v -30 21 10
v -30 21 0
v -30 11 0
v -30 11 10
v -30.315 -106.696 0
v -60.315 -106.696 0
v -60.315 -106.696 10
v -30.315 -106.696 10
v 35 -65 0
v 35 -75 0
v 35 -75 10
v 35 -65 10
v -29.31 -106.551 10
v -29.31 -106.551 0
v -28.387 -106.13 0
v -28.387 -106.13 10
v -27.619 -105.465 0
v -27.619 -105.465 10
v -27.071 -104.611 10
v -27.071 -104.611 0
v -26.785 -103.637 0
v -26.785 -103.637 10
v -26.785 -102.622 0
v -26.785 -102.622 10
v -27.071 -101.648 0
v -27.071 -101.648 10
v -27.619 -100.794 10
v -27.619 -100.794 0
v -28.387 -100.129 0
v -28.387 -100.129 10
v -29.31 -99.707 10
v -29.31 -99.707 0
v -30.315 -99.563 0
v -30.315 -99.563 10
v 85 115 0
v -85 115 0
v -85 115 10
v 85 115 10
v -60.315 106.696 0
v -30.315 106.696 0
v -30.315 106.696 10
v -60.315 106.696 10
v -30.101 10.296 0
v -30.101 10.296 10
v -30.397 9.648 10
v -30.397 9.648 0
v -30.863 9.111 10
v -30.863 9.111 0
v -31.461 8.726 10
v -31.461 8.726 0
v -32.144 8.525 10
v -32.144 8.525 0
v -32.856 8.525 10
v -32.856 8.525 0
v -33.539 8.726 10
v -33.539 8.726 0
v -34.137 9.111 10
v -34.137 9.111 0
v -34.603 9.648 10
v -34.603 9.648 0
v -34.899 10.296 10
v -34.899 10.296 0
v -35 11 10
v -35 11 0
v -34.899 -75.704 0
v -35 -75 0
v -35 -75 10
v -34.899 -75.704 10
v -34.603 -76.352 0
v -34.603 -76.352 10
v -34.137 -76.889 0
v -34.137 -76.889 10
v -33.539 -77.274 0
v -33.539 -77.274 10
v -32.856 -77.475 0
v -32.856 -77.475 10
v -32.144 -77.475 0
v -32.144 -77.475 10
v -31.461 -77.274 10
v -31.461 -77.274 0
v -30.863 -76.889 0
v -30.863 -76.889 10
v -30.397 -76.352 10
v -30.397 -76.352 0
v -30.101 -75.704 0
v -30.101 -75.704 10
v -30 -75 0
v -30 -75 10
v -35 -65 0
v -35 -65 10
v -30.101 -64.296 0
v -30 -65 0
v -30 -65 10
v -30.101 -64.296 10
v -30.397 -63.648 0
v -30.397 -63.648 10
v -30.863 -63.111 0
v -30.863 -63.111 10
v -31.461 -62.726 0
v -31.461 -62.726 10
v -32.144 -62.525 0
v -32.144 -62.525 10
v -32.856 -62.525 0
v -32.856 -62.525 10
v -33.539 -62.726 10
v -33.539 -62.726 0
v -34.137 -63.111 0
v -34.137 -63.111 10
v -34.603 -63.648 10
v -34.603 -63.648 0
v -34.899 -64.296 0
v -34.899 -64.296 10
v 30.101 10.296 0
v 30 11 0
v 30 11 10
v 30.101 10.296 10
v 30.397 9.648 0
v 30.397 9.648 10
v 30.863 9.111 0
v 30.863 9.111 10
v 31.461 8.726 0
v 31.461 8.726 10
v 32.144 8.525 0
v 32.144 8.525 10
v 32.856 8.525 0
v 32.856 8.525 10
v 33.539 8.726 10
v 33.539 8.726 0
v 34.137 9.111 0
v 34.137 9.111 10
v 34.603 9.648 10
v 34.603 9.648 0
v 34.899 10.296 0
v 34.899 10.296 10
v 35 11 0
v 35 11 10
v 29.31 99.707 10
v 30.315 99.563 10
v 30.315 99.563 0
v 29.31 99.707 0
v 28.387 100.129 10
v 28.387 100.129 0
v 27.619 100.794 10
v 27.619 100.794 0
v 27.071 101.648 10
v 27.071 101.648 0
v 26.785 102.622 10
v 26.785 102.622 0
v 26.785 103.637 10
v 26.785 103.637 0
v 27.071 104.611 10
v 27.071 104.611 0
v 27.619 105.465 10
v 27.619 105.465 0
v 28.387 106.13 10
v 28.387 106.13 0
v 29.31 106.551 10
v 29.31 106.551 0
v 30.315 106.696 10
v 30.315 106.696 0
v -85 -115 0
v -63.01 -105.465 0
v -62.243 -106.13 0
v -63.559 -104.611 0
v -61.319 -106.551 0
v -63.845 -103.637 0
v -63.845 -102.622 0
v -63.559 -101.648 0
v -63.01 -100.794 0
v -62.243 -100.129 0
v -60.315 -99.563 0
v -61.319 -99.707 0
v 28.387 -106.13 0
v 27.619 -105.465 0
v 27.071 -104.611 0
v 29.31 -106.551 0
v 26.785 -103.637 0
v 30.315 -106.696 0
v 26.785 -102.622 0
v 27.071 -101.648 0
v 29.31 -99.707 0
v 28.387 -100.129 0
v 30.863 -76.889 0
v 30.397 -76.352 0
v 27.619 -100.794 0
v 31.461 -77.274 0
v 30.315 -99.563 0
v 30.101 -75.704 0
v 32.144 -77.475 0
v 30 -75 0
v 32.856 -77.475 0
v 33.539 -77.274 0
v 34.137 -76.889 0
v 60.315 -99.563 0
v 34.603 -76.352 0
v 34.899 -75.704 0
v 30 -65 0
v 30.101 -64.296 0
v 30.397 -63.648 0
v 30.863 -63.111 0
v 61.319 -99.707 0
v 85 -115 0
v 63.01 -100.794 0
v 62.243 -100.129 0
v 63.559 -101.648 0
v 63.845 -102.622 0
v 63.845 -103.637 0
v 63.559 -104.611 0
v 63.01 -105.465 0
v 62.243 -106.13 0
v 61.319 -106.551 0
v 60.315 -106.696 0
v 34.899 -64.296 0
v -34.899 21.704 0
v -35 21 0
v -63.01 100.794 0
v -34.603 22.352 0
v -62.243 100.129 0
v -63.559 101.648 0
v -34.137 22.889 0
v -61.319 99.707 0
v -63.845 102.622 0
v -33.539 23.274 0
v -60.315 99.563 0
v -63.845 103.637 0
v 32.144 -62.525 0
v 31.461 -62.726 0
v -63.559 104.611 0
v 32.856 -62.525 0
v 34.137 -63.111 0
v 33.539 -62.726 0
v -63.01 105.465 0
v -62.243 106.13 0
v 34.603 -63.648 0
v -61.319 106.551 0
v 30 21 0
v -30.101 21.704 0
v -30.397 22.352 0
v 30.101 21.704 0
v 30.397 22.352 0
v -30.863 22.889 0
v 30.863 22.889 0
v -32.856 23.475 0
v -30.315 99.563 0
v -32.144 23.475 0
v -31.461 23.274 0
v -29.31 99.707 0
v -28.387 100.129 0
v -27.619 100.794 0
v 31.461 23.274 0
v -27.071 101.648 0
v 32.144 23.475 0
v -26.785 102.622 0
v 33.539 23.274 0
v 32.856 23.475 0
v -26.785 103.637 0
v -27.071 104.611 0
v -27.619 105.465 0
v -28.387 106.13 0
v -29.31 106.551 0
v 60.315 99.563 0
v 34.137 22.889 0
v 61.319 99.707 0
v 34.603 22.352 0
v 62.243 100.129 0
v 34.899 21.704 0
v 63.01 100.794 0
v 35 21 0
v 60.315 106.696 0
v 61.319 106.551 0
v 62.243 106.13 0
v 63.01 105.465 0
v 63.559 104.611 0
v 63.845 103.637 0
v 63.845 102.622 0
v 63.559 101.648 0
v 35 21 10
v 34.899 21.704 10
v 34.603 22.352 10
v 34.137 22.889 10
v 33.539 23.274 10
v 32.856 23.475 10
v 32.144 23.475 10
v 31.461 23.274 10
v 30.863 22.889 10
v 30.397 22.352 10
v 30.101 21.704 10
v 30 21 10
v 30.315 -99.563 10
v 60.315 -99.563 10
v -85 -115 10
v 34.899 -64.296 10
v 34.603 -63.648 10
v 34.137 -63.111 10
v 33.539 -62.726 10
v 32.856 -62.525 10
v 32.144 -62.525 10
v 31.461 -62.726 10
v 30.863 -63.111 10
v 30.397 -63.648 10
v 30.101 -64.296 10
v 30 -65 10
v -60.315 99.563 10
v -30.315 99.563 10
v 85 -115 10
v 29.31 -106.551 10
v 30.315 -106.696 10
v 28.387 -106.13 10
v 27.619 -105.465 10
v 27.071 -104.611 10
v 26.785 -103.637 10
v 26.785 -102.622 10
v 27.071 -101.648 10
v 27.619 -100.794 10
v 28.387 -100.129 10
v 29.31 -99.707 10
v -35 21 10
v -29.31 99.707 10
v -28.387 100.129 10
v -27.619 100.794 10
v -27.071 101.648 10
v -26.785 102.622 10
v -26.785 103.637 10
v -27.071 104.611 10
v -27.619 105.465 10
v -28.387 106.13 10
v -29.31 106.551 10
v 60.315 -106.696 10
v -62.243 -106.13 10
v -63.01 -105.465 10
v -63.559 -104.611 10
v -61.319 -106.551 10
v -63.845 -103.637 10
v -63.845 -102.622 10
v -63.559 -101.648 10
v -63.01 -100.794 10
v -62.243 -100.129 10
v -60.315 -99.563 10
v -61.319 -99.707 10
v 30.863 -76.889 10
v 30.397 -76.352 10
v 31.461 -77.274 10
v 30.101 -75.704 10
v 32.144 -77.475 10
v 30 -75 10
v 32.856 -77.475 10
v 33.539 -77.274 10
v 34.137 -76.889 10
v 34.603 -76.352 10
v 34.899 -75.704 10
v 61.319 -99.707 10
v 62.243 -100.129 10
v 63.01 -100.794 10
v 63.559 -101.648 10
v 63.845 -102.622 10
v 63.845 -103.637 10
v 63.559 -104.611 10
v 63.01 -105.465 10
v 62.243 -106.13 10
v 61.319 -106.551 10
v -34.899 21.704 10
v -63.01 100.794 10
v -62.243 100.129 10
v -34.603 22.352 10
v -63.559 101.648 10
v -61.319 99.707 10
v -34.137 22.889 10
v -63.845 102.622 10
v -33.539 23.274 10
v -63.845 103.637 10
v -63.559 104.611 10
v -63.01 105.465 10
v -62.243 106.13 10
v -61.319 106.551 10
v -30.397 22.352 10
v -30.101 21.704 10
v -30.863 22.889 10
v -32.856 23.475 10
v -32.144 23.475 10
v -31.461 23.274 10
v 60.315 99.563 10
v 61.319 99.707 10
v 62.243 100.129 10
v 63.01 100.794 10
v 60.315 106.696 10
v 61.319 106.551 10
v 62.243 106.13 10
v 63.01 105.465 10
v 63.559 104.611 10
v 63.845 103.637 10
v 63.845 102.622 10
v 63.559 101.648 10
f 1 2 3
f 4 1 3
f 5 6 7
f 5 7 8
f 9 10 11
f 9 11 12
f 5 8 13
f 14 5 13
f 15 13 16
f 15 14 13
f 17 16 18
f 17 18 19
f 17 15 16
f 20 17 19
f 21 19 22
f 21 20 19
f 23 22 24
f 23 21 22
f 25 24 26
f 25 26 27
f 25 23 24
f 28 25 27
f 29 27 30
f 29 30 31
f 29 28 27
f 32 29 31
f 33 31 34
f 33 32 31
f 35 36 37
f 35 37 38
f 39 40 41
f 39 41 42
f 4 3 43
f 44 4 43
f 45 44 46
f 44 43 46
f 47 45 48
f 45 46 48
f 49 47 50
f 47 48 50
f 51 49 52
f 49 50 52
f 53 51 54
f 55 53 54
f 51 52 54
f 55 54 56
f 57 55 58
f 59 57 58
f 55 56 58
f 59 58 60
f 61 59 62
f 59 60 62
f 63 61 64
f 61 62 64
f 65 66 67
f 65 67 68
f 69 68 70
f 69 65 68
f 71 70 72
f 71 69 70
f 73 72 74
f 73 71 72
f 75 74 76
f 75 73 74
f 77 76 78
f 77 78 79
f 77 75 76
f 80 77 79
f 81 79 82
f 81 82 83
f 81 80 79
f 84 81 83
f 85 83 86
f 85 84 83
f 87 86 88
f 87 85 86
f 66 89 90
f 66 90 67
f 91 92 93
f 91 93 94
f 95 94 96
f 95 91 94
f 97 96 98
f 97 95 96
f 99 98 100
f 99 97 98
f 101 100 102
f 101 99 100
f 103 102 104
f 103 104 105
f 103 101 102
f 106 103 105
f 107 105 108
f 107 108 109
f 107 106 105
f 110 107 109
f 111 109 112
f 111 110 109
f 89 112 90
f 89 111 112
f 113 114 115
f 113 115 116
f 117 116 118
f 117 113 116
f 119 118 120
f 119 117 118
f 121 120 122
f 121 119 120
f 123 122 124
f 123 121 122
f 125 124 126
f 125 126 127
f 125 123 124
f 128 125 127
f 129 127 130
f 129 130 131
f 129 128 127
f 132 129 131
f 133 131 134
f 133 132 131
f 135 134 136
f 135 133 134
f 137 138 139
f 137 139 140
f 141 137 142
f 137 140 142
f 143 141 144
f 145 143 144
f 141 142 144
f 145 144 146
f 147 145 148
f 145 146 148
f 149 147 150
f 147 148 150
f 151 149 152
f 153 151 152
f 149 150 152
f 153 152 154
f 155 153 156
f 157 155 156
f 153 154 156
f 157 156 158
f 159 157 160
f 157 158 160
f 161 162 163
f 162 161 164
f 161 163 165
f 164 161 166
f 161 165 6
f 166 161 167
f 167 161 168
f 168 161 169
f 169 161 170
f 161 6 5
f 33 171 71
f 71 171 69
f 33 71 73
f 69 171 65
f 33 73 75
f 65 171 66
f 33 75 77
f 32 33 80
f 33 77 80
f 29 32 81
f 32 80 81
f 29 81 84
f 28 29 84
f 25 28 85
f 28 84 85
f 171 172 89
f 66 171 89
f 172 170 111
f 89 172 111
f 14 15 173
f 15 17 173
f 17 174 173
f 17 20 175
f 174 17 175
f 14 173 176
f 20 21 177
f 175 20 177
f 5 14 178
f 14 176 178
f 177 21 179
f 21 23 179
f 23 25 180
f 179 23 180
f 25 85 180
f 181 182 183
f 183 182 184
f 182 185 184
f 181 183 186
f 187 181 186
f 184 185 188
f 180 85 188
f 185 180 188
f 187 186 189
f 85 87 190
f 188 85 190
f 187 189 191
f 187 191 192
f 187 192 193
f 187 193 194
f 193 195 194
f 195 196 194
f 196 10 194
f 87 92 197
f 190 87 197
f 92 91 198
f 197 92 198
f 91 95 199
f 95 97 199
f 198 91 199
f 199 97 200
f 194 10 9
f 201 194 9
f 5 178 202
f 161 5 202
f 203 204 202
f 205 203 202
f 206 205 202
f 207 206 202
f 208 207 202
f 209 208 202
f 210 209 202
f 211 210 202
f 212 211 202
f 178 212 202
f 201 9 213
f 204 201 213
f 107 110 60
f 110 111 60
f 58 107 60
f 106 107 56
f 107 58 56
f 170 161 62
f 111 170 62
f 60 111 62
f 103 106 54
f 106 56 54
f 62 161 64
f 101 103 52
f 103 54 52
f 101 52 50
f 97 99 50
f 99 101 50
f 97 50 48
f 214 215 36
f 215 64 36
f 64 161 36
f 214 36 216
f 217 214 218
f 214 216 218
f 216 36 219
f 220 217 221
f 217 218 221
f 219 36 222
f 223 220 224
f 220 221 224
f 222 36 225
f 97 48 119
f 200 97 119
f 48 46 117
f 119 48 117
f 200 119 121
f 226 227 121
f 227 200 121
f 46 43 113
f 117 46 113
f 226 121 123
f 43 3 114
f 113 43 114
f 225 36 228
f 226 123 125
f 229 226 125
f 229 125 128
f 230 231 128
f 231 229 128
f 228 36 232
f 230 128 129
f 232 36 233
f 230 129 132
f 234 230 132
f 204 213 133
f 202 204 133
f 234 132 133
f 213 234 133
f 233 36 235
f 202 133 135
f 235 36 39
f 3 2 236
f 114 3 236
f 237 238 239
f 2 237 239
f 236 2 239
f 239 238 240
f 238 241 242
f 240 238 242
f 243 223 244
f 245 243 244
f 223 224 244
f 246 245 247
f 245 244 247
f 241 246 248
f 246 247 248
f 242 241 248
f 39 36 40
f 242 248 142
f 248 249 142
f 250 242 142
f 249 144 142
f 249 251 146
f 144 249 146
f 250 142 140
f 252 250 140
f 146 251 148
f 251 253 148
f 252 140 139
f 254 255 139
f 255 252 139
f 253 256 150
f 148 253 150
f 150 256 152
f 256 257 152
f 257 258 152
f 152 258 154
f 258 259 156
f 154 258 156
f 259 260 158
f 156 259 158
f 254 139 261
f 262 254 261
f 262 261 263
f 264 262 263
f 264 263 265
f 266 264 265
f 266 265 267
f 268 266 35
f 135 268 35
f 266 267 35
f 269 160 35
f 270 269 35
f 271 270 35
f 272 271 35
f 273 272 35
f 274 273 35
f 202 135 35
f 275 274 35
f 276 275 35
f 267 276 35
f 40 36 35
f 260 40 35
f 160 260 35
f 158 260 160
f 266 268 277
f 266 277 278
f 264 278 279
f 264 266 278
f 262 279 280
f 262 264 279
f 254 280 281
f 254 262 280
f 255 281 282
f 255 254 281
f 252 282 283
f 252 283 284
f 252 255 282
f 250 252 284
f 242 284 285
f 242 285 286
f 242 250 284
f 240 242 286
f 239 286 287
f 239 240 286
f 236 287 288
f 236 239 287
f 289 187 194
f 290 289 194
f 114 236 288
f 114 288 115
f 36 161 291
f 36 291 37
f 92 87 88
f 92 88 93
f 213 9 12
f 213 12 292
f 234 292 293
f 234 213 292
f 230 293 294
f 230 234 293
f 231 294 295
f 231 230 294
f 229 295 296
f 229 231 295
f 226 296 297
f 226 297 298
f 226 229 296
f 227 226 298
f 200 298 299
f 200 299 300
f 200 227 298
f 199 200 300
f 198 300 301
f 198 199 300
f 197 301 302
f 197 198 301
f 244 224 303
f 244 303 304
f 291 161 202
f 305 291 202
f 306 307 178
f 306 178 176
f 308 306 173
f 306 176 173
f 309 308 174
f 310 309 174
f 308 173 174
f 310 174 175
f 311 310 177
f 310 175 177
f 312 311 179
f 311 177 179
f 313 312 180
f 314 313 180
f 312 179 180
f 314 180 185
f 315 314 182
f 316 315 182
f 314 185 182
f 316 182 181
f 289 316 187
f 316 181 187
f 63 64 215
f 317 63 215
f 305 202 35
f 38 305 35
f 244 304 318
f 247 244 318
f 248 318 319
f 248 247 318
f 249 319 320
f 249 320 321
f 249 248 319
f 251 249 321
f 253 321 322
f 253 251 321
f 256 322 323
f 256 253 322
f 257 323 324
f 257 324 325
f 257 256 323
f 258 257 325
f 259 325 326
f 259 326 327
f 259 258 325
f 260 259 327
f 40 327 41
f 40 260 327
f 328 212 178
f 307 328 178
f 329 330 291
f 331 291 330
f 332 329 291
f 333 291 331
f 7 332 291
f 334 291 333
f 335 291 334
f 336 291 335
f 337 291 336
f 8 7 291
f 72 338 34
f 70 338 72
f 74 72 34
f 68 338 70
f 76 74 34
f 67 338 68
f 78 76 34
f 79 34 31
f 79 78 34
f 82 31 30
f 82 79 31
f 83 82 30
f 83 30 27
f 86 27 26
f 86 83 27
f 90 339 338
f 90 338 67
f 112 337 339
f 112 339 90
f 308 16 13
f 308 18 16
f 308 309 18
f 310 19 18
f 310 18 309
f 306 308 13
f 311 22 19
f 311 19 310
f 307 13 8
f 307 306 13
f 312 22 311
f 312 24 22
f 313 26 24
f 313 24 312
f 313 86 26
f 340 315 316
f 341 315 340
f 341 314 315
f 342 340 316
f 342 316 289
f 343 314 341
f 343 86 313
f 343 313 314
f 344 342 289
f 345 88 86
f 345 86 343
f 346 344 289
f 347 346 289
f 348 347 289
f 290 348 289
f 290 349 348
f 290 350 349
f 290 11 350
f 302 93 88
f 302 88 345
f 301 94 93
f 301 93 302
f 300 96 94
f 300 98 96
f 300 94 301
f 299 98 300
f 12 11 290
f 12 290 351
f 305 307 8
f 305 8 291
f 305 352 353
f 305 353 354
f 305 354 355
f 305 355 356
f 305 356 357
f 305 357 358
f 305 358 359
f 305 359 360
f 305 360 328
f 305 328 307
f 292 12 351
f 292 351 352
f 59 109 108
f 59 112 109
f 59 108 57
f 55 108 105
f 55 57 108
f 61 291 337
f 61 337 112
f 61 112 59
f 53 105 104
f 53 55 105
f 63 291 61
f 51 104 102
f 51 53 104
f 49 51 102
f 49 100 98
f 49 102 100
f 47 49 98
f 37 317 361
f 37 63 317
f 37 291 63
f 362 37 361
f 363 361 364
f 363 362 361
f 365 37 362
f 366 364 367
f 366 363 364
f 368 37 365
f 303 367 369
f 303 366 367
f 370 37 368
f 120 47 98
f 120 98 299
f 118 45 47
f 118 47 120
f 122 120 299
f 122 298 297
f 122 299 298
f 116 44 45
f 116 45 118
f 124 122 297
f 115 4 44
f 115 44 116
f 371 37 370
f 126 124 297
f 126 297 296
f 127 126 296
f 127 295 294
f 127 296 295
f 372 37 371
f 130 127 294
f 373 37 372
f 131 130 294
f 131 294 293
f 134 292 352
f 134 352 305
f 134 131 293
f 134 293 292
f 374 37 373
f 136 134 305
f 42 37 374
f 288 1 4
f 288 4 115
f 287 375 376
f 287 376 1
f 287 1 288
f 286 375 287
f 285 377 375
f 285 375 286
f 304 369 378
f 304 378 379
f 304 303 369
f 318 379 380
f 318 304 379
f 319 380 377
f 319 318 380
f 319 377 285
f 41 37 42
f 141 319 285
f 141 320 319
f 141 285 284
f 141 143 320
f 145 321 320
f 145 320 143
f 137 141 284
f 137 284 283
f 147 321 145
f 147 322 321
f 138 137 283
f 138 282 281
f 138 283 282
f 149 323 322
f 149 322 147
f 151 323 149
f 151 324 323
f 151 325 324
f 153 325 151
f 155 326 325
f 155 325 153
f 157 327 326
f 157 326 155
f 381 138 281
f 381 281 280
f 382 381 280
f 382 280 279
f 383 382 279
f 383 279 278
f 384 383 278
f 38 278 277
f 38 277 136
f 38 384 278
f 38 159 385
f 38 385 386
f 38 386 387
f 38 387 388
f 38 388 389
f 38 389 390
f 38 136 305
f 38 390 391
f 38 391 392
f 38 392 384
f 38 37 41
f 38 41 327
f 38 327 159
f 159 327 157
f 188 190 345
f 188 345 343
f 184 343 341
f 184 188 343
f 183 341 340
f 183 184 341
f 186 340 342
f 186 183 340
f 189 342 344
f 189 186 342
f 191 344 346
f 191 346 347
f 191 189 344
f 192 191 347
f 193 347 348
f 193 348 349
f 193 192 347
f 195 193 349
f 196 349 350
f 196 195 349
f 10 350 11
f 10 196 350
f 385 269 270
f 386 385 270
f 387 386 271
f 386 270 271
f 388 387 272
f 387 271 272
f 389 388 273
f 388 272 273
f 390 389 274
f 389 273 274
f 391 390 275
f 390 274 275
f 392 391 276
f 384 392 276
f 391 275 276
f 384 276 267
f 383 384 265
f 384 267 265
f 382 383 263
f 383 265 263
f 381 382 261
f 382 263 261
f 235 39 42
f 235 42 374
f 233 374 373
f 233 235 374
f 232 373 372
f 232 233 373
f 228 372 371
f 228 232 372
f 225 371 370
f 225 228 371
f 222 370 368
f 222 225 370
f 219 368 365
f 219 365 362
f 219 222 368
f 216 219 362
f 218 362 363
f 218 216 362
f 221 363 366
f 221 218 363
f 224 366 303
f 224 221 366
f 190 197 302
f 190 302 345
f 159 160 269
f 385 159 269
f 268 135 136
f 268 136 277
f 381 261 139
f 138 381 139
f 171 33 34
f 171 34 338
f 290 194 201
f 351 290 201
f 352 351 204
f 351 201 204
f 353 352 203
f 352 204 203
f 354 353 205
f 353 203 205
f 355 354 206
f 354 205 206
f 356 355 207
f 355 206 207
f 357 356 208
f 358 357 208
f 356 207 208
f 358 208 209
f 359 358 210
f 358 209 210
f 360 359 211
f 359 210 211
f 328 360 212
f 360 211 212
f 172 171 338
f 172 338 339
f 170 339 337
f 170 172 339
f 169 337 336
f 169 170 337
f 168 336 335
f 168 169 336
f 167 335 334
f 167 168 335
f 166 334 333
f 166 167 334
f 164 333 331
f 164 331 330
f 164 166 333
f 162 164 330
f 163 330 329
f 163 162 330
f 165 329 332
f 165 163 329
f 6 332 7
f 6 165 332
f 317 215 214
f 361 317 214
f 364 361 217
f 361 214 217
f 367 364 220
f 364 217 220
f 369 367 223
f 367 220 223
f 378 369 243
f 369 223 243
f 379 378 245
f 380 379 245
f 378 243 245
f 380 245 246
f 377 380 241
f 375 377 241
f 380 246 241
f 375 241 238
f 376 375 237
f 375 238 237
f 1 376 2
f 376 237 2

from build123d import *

# Parameters (mm, degrees)
SKETCH1_W           = 170
SKETCH1_H           = 230
BOSS_EXTRUDE1_DEPTH = 10


with BuildPart() as part:
    # Sketch1 → Boss-Extrude1 (new body)
    with BuildSketch(Plane.XY):
        Rectangle(SKETCH1_W, SKETCH1_H)
        with BuildLine():
            Line((30.314685315, 106.695804196), (60.314685315, 106.695804196))
            ThreePointArc((60.314685315, 106.695804196), (63.881118881, 103.129370629), (60.314685315, 99.562937063))
            Line((60.314685315, 99.562937063), (30.314685315, 99.562937063))
            ThreePointArc((30.314685315, 99.562937063), (26.748251748, 103.129370629), (30.314685315, 106.695804196))
        make_face(mode=Mode.SUBTRACT)
        with BuildLine():
            Line((35, -75), (35, -65))
            ThreePointArc((35, -65), (32.5, -62.5), (30, -65))
            Line((30, -65), (30, -75))
            ThreePointArc((30, -75), (32.5, -77.5), (35, -75))
        make_face(mode=Mode.SUBTRACT)
        with BuildLine():
            Line((-30.314685315, 106.695804196), (-60.314685315, 106.695804196))
            ThreePointArc((-60.314685315, 106.695804196), (-63.881118881, 103.129370629), (-60.314685315, 99.562937063))
            Line((-60.314685315, 99.562937063), (-30.314685315, 99.562937063))
            ThreePointArc((-30.314685315, 99.562937063), (-26.748251748, 103.129370629), (-30.314685315, 106.695804196))
        make_face(mode=Mode.SUBTRACT)
        with BuildLine():
            Line((30, 21), (30, 11))
            ThreePointArc((30, 11), (32.5, 8.5), (35, 11))
            Line((35, 11), (35, 21))
            ThreePointArc((35, 21), (32.5, 23.5), (30, 21))
        make_face(mode=Mode.SUBTRACT)
        with BuildLine():
            Line((-30, 21), (-30, 11))
            ThreePointArc((-30, 11), (-32.5, 8.5), (-35, 11))
            Line((-35, 11), (-35, 21))
            ThreePointArc((-35, 21), (-32.5, 23.5), (-30, 21))
        make_face(mode=Mode.SUBTRACT)
        with BuildLine():
            Line((-30, -75), (-30, -65))
            ThreePointArc((-30, -65), (-32.5, -62.5), (-35, -65))
            Line((-35, -65), (-35, -75))
            ThreePointArc((-35, -75), (-32.5, -77.5), (-30, -75))
        make_face(mode=Mode.SUBTRACT)
        with BuildLine():
            Line((-30.314685315, -99.562937063), (-60.314685315, -99.562937063))
            ThreePointArc((-60.314685315, -99.562937063), (-63.881118881, -103.129370629), (-60.314685315, -106.695804196))
            Line((-60.314685315, -106.695804196), (-30.314685315, -106.695804196))
            ThreePointArc((-30.314685315, -106.695804196), (-26.748251748, -103.129370629), (-30.314685315, -99.562937063))
        make_face(mode=Mode.SUBTRACT)
        with BuildLine():
            Line((30.314685315, -99.562937063), (60.314685315, -99.562937063))
            ThreePointArc((60.314685315, -99.562937063), (63.881118881, -103.129370629), (60.314685315, -106.695804196))
            Line((60.314685315, -106.695804196), (30.314685315, -106.695804196))
            ThreePointArc((30.314685315, -106.695804196), (26.748251748, -103.129370629), (30.314685315, -99.562937063))
        make_face(mode=Mode.SUBTRACT)
    extrude(amount=BOSS_EXTRUDE1_DEPTH)


solid = part.part
